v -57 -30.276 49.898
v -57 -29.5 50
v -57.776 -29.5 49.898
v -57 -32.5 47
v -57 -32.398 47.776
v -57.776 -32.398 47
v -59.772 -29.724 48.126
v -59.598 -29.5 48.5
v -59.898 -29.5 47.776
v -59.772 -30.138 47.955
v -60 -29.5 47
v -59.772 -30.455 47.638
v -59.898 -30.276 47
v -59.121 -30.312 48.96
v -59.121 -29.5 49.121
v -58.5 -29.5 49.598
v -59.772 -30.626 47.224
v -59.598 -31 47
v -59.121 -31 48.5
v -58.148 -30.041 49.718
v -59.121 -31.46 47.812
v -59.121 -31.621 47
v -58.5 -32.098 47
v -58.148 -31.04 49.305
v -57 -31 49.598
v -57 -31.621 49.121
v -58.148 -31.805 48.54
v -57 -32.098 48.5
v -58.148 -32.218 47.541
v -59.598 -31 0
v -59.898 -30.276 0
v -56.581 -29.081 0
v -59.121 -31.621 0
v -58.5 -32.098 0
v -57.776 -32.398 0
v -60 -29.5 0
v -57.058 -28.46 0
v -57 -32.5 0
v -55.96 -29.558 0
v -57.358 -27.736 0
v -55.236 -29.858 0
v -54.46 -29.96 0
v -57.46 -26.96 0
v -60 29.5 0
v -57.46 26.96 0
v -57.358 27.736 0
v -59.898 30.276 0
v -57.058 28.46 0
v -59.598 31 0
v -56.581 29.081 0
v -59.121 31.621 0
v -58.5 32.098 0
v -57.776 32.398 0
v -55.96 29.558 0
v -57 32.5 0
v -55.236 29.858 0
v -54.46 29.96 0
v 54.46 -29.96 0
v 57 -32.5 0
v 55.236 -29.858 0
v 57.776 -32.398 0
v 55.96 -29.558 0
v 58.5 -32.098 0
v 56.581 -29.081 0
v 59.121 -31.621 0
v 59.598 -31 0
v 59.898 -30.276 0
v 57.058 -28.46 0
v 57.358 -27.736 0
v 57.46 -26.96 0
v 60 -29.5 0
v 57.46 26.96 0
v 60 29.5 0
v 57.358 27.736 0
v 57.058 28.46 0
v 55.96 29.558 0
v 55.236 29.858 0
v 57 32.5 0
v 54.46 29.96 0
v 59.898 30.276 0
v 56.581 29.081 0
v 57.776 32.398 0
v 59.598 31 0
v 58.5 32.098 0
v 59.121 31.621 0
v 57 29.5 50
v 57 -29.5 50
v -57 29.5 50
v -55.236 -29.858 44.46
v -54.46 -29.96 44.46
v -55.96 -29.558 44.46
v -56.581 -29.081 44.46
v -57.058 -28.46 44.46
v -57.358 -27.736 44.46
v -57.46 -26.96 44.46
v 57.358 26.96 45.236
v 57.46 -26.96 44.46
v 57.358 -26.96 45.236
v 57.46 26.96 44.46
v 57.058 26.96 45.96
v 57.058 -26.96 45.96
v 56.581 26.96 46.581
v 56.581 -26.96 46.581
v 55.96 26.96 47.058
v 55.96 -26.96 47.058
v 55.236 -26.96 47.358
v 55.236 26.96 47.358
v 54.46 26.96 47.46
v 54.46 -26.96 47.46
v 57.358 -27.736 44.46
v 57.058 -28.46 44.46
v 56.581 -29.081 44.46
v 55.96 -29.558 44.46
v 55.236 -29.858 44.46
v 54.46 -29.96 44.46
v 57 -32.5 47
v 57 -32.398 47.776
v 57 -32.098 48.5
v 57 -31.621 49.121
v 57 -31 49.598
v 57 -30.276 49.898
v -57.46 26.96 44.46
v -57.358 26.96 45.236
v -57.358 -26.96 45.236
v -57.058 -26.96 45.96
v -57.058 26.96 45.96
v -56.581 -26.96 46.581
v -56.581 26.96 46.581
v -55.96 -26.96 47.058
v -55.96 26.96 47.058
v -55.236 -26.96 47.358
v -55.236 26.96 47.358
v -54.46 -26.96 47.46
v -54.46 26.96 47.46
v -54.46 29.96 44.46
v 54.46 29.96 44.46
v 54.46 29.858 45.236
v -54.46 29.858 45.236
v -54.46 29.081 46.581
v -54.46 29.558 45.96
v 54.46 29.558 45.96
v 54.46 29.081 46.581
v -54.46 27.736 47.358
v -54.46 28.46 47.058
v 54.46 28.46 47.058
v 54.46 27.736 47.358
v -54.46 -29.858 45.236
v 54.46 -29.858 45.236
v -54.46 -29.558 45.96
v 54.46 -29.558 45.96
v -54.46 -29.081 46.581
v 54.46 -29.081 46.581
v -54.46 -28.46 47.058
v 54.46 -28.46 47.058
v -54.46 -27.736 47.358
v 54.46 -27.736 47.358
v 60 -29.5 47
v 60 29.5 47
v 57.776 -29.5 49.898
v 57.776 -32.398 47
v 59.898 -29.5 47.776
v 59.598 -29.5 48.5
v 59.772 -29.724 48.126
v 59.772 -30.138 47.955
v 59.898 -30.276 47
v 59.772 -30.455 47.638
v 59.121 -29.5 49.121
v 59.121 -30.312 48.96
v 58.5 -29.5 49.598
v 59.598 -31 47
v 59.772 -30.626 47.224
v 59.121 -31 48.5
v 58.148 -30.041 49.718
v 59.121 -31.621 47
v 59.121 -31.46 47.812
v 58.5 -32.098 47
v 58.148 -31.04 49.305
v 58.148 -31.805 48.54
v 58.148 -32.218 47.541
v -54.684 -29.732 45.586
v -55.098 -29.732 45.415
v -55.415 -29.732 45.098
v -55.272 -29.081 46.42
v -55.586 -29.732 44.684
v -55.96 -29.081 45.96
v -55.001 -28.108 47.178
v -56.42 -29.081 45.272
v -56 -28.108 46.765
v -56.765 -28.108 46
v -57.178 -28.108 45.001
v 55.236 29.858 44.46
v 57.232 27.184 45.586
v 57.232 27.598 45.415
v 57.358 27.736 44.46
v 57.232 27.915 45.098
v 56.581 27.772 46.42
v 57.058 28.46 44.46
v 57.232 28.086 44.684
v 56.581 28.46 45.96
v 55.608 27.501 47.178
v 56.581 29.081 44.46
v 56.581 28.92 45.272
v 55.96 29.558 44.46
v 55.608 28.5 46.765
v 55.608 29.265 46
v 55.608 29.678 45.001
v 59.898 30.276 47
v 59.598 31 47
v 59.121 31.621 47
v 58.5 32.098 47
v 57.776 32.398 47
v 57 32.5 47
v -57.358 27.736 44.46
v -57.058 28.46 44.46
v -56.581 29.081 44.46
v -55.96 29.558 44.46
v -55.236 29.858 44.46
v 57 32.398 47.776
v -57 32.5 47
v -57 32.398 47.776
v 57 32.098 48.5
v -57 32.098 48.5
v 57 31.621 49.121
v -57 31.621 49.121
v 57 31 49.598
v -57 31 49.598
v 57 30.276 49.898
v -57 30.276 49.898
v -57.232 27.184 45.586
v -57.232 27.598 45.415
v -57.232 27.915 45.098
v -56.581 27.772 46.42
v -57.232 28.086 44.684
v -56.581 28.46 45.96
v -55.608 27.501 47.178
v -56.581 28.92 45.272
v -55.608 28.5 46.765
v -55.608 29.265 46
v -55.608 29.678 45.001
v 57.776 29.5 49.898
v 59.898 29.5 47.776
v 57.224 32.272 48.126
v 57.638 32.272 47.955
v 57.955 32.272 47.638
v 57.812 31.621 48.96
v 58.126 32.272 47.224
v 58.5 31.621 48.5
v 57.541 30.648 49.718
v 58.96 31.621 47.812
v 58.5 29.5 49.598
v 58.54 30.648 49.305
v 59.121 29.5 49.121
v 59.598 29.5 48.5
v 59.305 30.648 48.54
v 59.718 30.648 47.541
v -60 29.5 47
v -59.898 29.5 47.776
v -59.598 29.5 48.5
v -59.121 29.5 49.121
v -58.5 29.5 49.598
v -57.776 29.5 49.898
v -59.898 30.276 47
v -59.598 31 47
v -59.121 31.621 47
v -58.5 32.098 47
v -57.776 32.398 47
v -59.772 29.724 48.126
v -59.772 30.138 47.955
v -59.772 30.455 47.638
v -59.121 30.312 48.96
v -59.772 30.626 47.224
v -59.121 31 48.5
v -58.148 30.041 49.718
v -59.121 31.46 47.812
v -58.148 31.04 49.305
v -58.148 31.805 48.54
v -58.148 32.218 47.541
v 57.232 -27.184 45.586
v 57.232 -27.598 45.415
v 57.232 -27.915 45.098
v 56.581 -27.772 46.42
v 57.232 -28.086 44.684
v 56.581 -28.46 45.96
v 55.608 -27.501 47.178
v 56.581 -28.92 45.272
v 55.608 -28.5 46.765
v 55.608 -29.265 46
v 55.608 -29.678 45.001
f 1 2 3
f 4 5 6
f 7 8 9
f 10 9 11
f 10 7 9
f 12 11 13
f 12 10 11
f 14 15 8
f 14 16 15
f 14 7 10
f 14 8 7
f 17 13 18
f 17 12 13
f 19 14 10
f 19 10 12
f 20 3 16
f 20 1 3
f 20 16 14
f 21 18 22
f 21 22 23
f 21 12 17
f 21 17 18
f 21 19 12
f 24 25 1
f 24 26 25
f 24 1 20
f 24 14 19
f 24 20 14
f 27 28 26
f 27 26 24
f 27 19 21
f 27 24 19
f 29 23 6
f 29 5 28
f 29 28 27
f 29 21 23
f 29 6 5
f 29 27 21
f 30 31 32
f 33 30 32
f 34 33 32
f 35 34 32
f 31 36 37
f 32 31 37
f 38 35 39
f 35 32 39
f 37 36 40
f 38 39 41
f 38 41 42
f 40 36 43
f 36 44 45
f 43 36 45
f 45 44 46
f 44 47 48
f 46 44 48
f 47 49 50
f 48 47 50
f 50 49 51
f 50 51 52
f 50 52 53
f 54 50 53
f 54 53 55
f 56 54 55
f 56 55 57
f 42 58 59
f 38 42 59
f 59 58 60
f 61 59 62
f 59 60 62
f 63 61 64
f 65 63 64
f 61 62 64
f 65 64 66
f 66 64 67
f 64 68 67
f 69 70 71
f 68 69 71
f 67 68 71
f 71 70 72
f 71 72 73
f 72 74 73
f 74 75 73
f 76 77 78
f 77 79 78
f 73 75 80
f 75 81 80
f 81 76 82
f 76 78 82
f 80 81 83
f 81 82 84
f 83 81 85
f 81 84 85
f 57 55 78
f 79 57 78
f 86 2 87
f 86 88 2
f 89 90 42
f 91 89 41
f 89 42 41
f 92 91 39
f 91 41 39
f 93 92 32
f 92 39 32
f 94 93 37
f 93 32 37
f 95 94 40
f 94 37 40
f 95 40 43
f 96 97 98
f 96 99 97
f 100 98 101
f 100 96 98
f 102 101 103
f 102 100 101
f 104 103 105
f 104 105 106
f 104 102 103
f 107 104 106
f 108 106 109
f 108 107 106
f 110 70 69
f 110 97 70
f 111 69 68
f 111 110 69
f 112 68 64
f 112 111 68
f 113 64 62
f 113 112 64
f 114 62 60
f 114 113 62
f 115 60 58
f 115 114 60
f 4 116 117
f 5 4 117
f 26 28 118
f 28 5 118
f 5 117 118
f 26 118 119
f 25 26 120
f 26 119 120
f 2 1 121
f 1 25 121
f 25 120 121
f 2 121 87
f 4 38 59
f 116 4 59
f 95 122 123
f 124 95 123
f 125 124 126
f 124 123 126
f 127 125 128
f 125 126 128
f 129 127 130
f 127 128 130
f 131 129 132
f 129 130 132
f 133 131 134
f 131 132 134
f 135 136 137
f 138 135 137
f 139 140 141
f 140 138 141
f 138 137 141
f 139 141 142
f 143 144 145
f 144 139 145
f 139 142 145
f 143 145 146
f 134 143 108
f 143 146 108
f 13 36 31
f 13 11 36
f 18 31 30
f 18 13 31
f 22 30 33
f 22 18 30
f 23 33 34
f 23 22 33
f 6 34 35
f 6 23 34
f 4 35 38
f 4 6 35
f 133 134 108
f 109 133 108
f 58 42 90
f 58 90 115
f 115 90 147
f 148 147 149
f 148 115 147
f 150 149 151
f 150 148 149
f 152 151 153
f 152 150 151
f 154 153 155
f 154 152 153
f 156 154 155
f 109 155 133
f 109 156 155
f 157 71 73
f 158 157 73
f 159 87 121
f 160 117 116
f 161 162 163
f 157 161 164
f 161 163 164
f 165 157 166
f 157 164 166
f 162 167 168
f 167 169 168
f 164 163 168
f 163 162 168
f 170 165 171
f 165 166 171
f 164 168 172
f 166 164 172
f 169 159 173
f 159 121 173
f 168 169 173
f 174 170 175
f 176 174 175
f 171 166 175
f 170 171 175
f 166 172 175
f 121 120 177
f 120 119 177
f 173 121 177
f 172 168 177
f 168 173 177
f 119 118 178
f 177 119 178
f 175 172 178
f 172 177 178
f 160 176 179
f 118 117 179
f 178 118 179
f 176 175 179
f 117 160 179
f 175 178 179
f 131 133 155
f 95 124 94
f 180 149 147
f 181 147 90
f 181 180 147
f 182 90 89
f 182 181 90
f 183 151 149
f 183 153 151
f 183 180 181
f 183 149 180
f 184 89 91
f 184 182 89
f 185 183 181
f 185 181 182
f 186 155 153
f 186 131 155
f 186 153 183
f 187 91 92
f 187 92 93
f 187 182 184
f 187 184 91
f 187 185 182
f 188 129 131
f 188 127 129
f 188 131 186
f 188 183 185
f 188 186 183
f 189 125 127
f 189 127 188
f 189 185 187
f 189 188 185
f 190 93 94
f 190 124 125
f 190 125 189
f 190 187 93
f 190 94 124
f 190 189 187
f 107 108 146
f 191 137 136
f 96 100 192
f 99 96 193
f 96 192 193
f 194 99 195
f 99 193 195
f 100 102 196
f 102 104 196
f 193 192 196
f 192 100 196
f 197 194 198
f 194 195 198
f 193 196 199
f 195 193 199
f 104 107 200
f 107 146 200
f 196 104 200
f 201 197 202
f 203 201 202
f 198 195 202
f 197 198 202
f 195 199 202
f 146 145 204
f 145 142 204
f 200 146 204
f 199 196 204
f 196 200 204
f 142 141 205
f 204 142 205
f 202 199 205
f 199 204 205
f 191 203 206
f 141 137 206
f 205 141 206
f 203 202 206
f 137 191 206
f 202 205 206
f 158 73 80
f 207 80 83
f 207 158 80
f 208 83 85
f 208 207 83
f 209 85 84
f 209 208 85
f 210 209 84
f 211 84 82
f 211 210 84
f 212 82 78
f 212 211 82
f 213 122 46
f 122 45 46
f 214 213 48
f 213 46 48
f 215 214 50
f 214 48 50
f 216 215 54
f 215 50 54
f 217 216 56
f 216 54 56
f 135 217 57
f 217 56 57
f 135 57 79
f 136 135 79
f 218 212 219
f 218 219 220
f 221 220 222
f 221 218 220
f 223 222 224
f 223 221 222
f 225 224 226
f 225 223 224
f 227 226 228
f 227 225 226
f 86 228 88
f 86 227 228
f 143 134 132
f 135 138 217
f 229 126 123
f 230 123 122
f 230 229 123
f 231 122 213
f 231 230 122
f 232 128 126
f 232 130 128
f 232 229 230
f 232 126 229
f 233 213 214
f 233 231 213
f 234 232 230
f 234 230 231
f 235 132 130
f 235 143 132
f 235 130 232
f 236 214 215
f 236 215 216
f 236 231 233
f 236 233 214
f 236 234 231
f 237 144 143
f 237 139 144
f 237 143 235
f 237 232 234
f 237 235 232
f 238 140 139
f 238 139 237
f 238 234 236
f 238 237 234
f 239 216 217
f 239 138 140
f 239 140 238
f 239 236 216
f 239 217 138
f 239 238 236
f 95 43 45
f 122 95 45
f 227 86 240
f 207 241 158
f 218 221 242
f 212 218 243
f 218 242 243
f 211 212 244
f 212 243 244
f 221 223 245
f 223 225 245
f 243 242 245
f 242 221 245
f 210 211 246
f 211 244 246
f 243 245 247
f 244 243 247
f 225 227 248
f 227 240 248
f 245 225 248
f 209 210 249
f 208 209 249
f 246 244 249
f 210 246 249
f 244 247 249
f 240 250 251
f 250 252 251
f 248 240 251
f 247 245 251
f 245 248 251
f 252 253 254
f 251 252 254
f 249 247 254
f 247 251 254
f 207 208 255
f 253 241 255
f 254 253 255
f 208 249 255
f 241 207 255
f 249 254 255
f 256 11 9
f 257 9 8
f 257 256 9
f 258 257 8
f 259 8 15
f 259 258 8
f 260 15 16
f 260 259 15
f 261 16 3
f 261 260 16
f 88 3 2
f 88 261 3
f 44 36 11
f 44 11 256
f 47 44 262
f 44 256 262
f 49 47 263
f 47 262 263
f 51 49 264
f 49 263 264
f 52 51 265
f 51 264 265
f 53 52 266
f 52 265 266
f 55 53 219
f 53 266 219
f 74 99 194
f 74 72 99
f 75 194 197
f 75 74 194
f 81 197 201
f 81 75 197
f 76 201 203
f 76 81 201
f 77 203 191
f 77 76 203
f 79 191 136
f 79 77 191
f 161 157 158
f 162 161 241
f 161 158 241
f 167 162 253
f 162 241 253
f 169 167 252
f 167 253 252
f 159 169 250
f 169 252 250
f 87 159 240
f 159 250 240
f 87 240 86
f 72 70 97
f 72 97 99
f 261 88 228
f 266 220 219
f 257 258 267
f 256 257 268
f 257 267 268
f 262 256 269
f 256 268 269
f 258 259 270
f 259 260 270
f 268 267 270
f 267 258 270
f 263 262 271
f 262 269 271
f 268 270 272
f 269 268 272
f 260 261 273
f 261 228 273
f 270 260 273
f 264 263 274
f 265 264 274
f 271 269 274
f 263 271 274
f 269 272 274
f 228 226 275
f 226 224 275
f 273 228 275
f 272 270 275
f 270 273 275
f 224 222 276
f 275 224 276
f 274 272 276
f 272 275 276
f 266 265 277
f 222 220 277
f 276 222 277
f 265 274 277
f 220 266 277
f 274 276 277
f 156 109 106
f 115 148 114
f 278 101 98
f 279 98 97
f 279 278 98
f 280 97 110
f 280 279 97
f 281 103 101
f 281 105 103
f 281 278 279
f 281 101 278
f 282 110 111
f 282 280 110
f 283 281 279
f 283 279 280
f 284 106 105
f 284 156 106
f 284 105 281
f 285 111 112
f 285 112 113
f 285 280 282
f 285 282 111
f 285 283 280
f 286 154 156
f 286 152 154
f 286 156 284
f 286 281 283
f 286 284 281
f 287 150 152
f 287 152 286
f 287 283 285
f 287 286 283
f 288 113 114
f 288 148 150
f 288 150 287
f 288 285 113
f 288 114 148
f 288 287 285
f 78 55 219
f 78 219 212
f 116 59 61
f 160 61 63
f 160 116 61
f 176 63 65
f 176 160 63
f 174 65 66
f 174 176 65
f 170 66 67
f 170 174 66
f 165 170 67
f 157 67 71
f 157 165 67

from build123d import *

# Parameters (mm, degrees)
F0_W     = 120
F0_H     = 65
F1_DEPTH = 50
F2_T     = -2.54
F3_R     = 3
F4_R     = 3


with BuildPart() as f1:
    # F0 (on Top) → F1 (new body)
    with BuildSketch(Plane.XY):
        Rectangle(F0_W, F0_H)
    extrude(amount=F1_DEPTH)

    # F2
    f2_openings = [f1.faces().sort_by_distance(p)[0] for p in [
        (0, 0, 0),
    ]]
    offset(amount=F2_T, openings=f2_openings)

    # F3
    f3_edges = [f1.edges().sort_by_distance(p)[0] for p in [
        (0, -32.5, 50),
        (60, 0, 50),
        (0, 32.5, 50),
        (-60, 0, 50),
        (-60, 32.5, 25),
        (60, 32.5, 25),
        (60, -32.5, 25),
        (-60, -32.5, 25),
    ]]
    fillet(f3_edges, radius=F3_R)

    # F4
    f4_edges = [f1.edges().sort_by_distance(p)[0] for p in [
        (0, 29.96, 47.46),
        (-57.46, 0, 47.46),
        (0, -29.96, 47.46),
        (57.46, 0, 47.46),
        (57.46, -29.96, 23.73),
        (57.46, 29.96, 23.73),
        (-57.46, 29.96, 23.73),
        (-57.46, -29.96, 23.73),
    ]]
    fillet(f4_edges, radius=F4_R)


solid = f1.part
